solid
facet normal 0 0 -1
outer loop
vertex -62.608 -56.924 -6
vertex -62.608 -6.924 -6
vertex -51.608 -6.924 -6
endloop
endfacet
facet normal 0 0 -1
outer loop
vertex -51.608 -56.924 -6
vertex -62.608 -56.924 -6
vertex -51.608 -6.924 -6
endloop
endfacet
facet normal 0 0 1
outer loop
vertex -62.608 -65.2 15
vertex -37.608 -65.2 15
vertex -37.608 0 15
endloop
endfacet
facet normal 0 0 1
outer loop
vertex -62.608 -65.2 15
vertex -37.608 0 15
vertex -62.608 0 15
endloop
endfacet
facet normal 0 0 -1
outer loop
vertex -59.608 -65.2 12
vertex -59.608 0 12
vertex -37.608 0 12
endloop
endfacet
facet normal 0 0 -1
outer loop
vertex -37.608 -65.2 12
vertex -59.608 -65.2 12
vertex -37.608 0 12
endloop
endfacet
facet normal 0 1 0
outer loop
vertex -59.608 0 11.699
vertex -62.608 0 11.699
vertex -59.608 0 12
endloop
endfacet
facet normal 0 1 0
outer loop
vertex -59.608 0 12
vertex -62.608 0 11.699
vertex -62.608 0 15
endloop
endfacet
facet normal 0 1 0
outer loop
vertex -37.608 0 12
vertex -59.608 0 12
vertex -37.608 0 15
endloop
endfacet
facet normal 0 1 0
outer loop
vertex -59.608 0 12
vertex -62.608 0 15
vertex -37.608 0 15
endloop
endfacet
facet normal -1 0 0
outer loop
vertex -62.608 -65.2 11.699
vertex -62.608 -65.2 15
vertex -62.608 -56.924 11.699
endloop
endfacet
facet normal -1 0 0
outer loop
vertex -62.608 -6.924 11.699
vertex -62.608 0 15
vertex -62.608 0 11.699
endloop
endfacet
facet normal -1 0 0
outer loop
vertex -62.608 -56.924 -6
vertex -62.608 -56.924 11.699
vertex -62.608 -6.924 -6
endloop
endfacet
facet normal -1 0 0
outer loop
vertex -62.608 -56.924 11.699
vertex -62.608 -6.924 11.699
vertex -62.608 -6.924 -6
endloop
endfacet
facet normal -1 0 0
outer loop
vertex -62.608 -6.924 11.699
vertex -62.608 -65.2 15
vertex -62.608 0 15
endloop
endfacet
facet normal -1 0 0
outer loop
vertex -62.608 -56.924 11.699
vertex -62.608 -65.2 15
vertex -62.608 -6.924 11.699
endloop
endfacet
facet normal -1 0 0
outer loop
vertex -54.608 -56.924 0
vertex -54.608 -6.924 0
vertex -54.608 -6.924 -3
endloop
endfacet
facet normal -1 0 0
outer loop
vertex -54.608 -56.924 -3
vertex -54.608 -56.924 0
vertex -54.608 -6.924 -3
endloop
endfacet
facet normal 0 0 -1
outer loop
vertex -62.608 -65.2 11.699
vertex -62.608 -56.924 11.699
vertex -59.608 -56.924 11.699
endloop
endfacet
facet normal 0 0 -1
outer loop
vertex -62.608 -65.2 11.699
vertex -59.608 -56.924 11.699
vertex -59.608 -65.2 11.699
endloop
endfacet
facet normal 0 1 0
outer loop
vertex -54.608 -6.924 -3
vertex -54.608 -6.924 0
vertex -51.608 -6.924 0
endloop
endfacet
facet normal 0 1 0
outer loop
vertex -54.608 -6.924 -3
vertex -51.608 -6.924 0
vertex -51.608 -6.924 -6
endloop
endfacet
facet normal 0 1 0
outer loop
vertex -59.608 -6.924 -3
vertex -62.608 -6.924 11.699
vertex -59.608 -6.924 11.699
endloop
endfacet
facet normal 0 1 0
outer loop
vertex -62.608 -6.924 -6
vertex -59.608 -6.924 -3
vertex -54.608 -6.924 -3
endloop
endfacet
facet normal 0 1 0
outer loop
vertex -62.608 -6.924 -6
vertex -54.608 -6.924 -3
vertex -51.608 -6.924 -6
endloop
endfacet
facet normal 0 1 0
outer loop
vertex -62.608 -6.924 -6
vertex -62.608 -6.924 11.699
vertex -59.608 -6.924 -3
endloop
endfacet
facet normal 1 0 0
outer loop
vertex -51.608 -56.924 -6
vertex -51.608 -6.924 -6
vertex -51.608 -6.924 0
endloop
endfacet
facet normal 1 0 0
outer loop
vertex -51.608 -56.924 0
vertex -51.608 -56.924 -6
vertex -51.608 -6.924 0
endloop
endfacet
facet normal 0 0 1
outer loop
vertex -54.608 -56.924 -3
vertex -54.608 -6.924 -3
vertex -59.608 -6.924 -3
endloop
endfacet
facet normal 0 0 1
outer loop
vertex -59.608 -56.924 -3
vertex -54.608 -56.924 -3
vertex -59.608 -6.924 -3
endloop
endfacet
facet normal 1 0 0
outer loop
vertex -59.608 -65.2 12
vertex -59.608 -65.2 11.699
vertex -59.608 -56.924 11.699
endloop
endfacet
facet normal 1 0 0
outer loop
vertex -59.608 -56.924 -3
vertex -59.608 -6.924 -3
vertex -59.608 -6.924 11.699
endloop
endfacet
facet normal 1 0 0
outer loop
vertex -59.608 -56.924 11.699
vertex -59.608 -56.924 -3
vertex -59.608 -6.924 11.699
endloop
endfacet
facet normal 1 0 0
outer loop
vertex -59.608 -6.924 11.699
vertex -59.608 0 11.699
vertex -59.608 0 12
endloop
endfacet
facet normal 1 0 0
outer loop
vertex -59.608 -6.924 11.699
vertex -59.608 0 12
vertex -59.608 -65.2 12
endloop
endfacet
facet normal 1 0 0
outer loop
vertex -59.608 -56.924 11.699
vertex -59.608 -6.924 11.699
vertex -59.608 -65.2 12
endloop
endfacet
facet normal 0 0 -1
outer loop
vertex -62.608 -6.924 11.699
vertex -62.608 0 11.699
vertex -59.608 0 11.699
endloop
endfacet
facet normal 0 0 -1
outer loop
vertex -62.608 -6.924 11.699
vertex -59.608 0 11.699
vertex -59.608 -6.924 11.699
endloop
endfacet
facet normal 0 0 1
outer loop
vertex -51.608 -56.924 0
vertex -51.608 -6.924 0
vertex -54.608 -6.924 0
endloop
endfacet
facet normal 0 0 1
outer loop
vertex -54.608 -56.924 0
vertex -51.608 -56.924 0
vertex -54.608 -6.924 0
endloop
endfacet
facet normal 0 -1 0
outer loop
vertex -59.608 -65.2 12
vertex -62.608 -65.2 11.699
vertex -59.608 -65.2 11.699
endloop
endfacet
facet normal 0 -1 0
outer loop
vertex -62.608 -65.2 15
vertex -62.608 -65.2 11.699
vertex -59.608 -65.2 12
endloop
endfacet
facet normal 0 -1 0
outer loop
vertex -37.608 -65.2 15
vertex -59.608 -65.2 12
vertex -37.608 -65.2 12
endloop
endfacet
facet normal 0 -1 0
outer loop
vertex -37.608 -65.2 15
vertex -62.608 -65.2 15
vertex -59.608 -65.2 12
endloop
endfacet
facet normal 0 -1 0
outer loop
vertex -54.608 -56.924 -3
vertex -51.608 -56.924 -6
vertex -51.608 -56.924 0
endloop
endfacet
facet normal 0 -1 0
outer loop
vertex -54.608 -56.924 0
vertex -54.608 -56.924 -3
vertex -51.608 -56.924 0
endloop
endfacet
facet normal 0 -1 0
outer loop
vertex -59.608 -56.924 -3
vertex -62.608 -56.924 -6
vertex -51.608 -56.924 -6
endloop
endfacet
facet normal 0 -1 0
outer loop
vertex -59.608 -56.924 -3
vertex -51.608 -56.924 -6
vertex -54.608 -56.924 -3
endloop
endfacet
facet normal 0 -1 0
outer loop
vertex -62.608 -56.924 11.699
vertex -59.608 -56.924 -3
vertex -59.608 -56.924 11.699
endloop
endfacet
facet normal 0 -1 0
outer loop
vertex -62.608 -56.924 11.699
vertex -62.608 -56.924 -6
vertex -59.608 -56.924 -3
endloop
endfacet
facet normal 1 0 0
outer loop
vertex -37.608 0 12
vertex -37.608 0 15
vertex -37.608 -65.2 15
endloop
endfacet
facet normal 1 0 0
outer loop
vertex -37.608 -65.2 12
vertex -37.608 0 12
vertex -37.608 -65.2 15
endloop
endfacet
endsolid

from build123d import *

# Parameters (mm, degrees)
F1_DEPTH = 65.2
F3_DEPTH = 25


with BuildPart() as f1:
    # F0 (on Front) → F1 (new body)
    with BuildSketch(Plane.XZ):
        Polygon((-27.608158, 12), (-27.608158, 15), (-62.608158, 15), (-62.608158, -6), (-51.608158, -6), (-51.608158, 0), (-54.608158, 0), (-54.608158, -3), (-59.608158, -3), (-59.608158, 12), align=None)
    extrude(amount=F1_DEPTH)

    # F2 (on face) → F3 (intersect)
    with BuildSketch(Plane(origin=(-62.608158, 0, 0), x_dir=(0, -1, 0), z_dir=(-1, 0, 0))):
        Polygon((0, 15), (0, 11.699338), (6.923881, 11.699338), (6.923881, -6), (32.6, -6), (56.923881, -6), (56.923881, 11.699338), (65.2, 11.699338), (65.2, 15), align=None)
    extrude(amount=-F3_DEPTH, mode=Mode.INTERSECT)


solid = f1.part
